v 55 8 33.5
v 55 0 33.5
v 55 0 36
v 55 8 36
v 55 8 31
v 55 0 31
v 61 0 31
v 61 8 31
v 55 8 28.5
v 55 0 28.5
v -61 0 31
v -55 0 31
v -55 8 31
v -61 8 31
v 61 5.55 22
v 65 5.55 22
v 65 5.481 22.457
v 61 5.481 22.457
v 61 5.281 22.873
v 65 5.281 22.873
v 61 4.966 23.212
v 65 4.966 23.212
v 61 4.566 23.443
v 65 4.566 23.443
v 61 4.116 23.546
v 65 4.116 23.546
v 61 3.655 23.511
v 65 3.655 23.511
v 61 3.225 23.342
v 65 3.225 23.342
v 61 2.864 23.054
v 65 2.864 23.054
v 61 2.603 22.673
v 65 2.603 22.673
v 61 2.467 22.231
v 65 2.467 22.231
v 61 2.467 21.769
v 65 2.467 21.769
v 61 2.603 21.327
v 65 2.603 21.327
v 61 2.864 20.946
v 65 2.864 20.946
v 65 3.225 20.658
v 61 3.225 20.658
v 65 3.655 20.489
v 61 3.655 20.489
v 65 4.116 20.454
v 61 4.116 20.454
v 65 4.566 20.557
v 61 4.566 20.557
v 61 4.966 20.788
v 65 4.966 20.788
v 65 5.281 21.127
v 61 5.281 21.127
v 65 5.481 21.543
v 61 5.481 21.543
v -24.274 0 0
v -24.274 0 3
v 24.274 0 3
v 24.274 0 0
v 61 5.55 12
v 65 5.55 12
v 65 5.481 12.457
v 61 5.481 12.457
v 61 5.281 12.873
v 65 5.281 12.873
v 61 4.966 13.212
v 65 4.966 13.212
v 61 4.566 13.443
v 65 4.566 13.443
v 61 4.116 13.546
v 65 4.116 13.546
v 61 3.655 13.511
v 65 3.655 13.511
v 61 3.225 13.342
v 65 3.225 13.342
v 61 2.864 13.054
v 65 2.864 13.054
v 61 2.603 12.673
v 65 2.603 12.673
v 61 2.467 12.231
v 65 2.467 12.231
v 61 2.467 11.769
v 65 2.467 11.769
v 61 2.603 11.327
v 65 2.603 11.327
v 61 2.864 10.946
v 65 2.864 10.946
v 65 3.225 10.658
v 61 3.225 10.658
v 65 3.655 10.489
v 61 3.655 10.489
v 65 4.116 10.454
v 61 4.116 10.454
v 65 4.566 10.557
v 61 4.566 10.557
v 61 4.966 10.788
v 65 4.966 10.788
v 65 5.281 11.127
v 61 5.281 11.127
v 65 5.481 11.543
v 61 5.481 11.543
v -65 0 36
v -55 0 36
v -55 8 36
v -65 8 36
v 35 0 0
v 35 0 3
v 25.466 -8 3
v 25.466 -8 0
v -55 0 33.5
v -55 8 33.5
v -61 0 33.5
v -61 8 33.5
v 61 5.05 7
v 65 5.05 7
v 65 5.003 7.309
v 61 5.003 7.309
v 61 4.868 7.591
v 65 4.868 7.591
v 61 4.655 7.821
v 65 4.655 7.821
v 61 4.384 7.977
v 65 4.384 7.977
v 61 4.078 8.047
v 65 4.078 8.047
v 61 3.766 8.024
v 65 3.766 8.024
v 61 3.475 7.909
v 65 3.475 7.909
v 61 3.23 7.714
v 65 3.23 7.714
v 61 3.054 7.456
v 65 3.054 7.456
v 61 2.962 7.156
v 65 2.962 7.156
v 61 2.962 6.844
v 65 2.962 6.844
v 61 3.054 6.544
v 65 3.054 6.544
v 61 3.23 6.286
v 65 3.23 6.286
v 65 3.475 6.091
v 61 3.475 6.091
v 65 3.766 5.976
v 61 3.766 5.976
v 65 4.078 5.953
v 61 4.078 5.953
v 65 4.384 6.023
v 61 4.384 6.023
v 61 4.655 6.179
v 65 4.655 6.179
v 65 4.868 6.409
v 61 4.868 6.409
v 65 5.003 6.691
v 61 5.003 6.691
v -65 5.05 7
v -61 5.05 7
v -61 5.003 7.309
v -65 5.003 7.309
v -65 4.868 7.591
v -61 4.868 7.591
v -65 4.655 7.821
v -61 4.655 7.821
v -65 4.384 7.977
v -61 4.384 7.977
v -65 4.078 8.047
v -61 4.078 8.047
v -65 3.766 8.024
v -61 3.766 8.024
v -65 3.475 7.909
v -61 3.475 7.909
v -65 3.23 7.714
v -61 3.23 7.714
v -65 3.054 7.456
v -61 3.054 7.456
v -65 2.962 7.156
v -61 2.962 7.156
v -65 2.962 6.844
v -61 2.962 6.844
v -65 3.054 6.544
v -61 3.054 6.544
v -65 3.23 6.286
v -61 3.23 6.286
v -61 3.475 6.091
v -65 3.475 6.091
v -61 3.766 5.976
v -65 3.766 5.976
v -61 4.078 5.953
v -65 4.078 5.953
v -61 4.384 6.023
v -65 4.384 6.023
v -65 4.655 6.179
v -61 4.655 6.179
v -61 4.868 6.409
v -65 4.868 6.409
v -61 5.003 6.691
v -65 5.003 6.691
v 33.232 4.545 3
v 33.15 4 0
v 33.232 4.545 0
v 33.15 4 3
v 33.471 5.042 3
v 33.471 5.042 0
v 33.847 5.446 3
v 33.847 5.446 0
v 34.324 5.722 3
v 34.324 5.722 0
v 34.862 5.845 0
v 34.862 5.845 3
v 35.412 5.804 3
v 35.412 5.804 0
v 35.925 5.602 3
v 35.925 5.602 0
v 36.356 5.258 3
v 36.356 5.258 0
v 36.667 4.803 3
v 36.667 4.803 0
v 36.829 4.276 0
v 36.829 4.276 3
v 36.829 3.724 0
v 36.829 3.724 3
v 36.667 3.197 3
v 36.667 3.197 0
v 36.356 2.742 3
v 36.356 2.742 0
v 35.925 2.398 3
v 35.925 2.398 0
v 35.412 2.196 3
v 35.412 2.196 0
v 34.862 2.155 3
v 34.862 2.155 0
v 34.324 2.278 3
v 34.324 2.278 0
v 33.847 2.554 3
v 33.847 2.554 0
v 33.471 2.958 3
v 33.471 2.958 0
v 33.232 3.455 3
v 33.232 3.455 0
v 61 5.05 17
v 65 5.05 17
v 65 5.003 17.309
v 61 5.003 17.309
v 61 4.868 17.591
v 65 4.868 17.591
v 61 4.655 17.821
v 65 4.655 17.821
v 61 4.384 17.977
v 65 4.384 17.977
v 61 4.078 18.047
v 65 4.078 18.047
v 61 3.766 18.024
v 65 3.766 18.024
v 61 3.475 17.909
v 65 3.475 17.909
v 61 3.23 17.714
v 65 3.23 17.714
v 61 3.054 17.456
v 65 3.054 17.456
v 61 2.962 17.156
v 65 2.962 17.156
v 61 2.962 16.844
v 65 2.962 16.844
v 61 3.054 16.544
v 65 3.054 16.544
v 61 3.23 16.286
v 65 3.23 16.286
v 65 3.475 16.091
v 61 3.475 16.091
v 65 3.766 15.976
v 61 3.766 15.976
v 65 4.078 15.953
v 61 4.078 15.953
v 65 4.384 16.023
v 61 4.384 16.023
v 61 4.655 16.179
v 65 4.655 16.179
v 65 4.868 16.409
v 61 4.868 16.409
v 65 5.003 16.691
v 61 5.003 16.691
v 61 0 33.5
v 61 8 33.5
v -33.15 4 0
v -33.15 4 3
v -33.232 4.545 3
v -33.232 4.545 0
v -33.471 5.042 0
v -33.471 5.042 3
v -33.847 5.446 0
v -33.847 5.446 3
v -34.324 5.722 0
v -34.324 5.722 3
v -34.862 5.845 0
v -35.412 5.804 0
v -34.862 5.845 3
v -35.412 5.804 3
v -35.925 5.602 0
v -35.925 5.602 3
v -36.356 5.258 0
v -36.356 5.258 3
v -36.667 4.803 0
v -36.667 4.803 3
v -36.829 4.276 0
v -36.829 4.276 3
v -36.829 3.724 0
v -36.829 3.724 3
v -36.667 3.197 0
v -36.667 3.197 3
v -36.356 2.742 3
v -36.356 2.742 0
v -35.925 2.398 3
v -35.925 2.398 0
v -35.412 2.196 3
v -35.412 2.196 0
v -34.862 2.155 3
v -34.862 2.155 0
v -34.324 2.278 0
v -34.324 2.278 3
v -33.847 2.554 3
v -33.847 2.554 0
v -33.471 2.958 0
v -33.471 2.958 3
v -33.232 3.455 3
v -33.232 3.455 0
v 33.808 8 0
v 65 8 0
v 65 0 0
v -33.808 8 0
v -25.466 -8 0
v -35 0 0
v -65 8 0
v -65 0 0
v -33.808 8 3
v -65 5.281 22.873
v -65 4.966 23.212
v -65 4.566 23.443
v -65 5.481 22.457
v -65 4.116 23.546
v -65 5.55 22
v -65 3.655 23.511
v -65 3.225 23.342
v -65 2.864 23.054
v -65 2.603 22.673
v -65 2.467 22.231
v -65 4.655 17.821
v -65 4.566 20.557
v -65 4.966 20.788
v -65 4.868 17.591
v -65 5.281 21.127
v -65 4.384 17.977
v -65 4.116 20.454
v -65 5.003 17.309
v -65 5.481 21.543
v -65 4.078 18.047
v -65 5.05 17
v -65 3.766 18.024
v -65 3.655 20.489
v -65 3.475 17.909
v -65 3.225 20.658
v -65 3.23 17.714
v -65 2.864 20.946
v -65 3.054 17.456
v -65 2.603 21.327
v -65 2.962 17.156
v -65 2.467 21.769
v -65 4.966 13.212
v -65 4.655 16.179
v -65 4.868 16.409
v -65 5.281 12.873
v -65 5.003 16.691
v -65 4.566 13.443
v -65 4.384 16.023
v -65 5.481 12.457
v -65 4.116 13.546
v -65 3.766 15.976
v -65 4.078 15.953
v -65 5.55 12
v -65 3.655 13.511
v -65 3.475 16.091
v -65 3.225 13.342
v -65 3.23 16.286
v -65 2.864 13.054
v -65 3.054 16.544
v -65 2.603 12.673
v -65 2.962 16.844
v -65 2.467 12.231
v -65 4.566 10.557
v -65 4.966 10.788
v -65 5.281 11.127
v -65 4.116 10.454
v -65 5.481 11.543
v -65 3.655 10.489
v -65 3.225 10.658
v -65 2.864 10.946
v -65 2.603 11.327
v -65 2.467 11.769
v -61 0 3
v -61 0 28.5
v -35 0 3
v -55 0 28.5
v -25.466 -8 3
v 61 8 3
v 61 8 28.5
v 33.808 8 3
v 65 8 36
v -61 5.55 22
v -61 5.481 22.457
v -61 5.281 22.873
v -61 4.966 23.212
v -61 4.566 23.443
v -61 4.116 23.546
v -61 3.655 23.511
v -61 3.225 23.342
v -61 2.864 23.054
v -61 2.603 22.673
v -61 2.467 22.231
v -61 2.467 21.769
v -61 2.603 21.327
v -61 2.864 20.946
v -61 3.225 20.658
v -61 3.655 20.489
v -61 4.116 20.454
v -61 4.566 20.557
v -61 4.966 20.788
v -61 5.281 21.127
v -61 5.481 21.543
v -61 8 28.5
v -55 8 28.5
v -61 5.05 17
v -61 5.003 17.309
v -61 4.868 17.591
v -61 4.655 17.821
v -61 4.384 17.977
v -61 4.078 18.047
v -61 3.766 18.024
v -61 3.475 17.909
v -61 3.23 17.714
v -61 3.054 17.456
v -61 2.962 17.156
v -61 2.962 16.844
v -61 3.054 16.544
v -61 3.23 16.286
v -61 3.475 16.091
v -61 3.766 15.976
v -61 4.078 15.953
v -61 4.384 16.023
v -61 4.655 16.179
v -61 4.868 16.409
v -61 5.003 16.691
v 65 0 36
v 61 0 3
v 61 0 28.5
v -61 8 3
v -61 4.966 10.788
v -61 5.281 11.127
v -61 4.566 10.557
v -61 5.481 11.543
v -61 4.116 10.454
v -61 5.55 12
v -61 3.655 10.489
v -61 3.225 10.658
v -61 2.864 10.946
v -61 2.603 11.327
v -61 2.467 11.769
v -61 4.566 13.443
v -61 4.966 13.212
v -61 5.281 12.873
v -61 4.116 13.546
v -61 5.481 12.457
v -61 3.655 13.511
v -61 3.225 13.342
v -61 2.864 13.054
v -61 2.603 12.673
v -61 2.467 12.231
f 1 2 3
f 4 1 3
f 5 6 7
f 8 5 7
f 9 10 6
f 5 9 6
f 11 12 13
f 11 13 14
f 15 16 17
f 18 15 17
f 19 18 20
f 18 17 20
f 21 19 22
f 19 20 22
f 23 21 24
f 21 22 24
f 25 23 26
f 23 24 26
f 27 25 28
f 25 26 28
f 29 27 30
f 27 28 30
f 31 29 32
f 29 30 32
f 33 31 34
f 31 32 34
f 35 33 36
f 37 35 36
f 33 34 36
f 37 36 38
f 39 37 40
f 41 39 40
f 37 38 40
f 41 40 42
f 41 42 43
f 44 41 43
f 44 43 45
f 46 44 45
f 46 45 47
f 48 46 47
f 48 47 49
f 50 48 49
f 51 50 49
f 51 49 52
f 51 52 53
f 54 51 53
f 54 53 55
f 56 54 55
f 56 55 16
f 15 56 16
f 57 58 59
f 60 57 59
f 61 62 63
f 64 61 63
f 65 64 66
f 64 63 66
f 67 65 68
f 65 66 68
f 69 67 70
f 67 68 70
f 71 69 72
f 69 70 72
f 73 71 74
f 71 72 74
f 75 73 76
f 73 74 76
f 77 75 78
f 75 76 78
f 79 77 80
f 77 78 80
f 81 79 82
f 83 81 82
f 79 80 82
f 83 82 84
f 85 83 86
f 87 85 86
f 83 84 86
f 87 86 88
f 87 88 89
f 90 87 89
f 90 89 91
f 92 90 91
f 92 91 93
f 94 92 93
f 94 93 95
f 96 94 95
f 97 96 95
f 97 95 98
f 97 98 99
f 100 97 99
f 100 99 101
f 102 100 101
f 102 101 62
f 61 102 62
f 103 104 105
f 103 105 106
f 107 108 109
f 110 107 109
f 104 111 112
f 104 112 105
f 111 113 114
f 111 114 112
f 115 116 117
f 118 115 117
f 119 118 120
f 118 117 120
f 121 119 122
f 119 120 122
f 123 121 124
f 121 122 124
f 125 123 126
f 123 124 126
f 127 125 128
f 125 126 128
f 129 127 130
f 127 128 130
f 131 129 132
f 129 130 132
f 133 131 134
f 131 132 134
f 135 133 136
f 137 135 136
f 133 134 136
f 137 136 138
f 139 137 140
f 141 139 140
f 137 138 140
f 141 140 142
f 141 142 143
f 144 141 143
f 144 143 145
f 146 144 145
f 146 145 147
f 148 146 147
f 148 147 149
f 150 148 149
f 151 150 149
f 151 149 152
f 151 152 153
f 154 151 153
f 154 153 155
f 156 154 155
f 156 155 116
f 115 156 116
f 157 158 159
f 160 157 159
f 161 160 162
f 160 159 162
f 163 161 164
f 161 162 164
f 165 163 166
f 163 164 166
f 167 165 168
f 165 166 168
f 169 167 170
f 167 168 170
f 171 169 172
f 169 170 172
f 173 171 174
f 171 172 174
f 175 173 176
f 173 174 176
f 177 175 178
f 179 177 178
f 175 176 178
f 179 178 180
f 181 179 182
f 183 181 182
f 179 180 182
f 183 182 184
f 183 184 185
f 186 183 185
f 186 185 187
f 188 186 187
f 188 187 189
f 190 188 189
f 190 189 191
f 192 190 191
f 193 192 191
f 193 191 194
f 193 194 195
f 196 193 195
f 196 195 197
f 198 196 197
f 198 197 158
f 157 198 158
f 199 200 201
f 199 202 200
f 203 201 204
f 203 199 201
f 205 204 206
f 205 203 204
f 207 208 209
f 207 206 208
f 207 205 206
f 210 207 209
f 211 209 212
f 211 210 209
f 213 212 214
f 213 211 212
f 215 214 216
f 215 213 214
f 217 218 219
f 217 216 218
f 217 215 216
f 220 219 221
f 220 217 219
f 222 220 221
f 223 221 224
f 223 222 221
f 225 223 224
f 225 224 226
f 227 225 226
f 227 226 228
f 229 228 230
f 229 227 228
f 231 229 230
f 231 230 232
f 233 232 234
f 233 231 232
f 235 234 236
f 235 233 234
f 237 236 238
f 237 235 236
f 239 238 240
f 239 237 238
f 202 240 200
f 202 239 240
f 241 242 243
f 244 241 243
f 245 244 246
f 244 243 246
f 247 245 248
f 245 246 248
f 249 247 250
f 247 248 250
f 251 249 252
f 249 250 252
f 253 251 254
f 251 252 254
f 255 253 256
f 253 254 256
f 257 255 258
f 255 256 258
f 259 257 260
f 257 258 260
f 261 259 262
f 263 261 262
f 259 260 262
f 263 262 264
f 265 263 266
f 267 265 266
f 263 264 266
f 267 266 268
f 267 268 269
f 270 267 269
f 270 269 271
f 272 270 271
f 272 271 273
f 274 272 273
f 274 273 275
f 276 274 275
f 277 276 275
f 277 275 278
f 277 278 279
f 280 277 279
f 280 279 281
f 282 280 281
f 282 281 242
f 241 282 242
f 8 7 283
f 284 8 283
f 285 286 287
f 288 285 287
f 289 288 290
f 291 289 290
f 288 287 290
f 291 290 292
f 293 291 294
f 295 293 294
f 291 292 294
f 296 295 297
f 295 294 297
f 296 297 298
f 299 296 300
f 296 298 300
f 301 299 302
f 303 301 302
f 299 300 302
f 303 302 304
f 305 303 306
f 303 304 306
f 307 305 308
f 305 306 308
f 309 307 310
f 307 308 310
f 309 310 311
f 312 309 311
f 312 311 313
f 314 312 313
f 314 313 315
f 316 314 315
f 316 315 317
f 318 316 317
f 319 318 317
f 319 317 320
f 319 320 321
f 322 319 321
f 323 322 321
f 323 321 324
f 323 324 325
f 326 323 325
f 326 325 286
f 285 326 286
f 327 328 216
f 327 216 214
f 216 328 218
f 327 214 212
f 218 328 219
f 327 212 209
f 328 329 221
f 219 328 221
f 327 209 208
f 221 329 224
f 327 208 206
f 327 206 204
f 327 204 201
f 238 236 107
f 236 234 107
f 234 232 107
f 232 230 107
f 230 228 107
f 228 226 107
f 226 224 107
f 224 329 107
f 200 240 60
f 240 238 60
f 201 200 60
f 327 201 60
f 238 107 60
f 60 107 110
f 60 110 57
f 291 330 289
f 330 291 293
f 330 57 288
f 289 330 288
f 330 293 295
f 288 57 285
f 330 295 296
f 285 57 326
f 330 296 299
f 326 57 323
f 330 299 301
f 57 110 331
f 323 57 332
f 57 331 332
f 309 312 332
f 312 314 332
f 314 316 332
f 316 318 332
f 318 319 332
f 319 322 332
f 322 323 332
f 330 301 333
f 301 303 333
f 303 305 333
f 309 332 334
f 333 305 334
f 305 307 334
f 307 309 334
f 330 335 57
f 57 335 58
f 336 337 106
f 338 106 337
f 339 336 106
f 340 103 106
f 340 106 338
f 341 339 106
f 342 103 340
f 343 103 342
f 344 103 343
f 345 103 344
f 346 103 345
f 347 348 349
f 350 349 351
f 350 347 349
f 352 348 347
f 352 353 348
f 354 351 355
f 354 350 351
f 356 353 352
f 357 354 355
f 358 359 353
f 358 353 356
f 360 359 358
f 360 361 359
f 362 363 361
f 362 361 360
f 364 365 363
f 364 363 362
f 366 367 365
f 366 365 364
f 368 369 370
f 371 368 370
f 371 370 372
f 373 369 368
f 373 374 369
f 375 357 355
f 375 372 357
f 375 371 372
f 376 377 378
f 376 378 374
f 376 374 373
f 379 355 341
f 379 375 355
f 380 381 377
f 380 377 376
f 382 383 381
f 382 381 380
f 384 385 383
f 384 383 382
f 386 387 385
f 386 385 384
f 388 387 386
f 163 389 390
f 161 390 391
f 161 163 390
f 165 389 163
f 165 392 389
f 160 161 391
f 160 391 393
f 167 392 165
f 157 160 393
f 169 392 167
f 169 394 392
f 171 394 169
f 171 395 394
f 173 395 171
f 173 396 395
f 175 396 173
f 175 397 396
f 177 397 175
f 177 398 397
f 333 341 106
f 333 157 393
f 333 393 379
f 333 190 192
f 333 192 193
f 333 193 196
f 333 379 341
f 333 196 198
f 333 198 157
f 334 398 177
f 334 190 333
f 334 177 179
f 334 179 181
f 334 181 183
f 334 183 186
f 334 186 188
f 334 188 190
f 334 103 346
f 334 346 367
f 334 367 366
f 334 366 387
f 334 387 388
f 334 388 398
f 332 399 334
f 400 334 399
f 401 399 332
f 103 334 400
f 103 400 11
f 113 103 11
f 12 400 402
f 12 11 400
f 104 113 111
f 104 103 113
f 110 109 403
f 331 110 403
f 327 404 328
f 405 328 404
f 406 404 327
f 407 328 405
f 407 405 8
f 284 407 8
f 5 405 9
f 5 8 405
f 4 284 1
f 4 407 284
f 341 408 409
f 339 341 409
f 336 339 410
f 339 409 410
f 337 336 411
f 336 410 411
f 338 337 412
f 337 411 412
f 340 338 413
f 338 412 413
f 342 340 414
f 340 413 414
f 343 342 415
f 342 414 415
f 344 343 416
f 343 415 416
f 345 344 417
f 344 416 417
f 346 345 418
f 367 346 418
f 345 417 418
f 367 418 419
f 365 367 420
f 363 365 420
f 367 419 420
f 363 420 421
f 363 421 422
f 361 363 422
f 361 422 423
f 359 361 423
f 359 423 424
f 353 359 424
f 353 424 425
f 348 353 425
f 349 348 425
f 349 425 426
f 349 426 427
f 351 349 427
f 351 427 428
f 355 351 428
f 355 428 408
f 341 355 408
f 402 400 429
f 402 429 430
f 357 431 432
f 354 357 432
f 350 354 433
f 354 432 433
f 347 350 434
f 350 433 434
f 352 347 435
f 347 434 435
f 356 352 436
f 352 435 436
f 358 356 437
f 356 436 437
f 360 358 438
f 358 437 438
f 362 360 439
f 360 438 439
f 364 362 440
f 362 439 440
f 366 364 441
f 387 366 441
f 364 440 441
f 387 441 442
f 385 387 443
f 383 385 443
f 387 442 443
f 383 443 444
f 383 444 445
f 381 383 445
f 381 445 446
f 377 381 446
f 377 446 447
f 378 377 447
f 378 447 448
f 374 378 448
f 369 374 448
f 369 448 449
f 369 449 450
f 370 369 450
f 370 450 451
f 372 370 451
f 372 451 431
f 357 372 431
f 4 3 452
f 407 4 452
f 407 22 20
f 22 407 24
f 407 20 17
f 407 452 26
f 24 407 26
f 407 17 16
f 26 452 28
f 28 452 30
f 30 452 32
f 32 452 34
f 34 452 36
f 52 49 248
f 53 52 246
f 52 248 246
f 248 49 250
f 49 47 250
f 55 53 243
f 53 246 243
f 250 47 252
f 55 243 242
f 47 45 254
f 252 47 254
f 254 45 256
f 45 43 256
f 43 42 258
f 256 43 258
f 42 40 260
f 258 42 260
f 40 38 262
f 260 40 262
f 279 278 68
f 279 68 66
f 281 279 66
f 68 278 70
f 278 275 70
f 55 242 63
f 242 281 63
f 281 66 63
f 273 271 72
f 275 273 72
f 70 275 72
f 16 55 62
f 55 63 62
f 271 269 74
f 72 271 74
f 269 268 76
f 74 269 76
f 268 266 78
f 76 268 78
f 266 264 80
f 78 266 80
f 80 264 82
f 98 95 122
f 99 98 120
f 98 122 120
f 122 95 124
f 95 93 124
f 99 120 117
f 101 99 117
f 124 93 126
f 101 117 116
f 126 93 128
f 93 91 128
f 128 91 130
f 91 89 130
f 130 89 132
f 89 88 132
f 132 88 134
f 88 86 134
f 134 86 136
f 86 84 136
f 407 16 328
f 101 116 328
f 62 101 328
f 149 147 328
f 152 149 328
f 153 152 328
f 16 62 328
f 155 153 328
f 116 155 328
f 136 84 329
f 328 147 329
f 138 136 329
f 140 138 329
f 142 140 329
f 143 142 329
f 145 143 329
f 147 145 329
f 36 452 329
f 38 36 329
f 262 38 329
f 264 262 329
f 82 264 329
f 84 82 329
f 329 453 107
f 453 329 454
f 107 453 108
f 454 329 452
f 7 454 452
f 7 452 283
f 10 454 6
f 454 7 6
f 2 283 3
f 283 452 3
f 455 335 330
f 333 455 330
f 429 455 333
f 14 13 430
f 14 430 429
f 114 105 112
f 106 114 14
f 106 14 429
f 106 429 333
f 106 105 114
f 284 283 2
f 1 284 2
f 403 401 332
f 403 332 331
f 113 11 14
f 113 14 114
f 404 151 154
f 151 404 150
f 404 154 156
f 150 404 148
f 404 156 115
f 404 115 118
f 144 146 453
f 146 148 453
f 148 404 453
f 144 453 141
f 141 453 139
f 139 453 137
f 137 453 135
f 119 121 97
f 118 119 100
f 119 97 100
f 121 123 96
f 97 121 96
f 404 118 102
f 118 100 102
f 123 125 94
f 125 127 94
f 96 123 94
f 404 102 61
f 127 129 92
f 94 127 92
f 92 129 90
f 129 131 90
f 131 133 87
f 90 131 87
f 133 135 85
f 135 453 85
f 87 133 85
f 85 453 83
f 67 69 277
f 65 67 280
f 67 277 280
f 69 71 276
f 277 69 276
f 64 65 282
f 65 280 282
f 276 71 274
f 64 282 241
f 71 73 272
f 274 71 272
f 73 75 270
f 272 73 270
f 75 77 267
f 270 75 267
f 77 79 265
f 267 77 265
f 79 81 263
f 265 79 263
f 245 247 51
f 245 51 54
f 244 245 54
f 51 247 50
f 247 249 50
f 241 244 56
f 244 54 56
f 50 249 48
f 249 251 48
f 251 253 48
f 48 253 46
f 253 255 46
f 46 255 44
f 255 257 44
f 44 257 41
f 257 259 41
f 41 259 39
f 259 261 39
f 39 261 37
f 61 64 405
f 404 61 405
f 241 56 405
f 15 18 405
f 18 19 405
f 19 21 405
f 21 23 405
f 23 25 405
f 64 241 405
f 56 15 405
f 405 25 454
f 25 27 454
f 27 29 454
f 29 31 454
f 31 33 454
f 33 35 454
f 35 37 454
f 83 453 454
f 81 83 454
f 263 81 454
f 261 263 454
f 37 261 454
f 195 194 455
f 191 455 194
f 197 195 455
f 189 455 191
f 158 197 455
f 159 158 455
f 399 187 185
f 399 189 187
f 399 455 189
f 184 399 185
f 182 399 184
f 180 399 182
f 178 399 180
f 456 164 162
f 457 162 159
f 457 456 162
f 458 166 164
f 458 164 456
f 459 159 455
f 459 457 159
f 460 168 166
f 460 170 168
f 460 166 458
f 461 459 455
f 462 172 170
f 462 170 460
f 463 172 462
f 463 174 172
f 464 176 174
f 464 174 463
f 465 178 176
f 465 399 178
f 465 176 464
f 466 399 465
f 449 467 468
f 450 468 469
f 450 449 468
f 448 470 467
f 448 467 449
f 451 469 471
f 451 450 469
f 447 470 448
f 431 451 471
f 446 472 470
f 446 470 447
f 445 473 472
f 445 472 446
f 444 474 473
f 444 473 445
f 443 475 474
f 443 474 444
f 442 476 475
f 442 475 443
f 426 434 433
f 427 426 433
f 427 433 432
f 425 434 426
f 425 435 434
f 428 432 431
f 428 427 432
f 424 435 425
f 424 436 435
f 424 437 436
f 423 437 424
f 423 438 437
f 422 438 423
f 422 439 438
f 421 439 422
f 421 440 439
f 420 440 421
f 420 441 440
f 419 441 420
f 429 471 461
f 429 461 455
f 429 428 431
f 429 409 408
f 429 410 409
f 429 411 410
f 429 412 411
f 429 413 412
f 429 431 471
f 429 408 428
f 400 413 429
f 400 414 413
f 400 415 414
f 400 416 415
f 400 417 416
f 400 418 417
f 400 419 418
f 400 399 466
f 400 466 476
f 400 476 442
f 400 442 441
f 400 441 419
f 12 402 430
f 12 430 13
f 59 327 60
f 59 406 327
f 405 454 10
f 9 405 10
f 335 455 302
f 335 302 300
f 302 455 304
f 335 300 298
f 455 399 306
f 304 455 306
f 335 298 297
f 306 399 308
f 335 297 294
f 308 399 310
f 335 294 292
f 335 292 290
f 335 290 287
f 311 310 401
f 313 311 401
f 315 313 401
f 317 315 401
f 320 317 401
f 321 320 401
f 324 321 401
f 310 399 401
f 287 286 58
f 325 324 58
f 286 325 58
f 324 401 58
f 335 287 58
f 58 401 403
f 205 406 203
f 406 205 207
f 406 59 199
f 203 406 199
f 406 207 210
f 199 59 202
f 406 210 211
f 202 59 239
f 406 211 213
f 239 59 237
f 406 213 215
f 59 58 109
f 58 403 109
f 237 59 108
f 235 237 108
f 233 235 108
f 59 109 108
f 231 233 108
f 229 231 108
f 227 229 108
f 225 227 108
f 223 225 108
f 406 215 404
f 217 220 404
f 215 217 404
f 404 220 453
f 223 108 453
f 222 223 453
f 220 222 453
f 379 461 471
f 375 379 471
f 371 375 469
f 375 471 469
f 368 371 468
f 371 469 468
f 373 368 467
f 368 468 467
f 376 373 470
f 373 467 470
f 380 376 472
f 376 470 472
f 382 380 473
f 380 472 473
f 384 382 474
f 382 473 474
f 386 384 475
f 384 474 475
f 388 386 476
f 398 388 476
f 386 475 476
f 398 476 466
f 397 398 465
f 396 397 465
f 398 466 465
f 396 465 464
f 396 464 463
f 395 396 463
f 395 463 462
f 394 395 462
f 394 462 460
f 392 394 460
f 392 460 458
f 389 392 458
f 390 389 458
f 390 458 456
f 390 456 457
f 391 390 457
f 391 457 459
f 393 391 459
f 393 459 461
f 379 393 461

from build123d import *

# Parameters (mm, degrees)
PAD_DEPTH         = 8
SKETCH002_R       = 1.85
POCKET_DEPTH      = 276.677278
POCKET_DEPTH_BACK = 302.677278
SKETCH_R          = 1.55
SKETCH_R_2        = 1.05
POCKET001_DEPTH   = 135.001


with BuildPart() as part:
    # Sketch001 → Pad (new body, symmetric)
    with BuildSketch(Plane.XZ):
        Polygon((-65, 36), (-65, 0), (0, 0), (0, 3), (-61, 3), (-61, 28.5), (-55, 28.5), (-55, 31), (-61, 31), (-61, 33.5), (-55, 33.5), (-55, 36), align=None)
    pad = extrude(amount=PAD_DEPTH, both=True)

    # Mirrored: Pad across Sketch001 V_Axis
    add(pad.mirror(Plane(origin=(0, 0, 0), x_dir=(0, -1, 0), z_dir=(1, 0, 0))))

    # Sketch002 → Pocket (cut, two sides)
    with BuildSketch(Plane.XY.offset(5)) as pocket_sk:
        with Locations((-35, 4)):
            Circle(SKETCH002_R)
        Polygon((-66, 0), (-35, 0), (-24.274218, -9), (-66, -9), align=None)
        Polygon((-35, 9), (-24.274218, 0), (0, 0), (0, 9), align=None)
    pocket = extrude(amount=-POCKET_DEPTH, mode=Mode.SUBTRACT) + extrude(pocket_sk.sketch, amount=POCKET_DEPTH_BACK, mode=Mode.SUBTRACT)

    # Mirrored001: Pocket across Sketch002 V_Axis
    add(pocket.mirror(Plane(origin=(0, 0, 5), x_dir=(0, 0, 1), z_dir=(1, 0, 0))), mode=Mode.SUBTRACT)

    # Sketch → Pocket001 (cut, through all)
    with BuildSketch(Plane.YZ.offset(70)):
        with Locations((4, 12)):
            Circle(SKETCH_R)
        with Locations((4, 7)):
            Circle(SKETCH_R_2)
        with Locations((4, 17)):
            Circle(SKETCH_R_2)
        with Locations((4, 22)):
            Circle(SKETCH_R)
    extrude(amount=-POCKET001_DEPTH, mode=Mode.SUBTRACT)


solid = part.part
